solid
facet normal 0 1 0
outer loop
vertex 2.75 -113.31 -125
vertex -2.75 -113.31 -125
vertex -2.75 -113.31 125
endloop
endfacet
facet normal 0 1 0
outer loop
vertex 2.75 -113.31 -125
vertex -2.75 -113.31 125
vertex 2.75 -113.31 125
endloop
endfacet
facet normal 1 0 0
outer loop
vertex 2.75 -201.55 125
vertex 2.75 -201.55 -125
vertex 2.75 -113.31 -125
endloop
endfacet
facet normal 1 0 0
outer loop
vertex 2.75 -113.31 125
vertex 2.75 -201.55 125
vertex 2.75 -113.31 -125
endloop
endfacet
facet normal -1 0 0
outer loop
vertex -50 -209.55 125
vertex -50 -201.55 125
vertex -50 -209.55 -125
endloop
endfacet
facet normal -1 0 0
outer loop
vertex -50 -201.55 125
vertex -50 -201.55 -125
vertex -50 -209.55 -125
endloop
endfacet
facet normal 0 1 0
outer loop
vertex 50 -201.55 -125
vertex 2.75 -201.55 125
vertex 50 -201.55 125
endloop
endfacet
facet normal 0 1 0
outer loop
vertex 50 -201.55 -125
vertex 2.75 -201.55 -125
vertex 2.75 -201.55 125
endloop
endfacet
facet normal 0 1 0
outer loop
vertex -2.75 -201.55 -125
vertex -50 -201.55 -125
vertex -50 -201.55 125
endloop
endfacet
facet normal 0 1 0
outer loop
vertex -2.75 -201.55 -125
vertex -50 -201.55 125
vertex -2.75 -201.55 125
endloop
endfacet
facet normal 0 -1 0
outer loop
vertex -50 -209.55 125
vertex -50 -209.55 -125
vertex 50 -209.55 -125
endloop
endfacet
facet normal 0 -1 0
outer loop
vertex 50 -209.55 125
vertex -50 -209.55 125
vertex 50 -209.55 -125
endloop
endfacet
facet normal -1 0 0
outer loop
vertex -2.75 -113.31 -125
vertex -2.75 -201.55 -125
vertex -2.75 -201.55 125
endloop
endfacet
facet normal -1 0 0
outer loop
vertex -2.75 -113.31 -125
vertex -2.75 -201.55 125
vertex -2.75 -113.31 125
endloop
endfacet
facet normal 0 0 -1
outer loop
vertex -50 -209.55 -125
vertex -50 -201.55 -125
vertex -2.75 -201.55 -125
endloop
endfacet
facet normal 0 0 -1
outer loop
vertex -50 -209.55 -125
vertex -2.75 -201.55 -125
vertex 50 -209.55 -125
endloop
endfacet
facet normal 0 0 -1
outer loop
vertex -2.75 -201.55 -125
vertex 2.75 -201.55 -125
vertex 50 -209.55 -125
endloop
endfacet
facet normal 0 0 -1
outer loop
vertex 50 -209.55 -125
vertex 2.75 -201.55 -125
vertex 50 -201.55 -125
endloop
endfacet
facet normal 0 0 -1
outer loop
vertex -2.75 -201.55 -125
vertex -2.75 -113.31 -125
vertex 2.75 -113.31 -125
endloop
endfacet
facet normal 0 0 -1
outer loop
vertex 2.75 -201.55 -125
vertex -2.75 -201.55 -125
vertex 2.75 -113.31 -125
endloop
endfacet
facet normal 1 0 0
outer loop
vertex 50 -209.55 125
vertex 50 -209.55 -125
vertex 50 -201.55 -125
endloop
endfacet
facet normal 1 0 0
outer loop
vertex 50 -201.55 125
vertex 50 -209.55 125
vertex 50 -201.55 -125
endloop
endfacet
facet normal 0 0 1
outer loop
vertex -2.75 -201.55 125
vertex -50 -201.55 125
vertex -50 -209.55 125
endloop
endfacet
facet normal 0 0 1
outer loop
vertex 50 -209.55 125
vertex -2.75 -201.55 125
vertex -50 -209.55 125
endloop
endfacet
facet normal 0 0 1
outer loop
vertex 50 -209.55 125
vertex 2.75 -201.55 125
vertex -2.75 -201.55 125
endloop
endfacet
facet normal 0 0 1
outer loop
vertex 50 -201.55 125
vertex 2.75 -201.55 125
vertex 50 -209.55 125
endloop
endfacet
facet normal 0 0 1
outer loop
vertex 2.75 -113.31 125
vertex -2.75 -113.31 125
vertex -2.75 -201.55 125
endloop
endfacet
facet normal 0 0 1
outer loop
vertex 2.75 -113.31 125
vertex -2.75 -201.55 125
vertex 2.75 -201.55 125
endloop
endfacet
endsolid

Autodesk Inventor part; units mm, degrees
ref_plane "YZ Plane" through (0, 0, 0) normal (1, 0, 0) x (0, 1, 0)
ref_plane "XZ Plane" through (0, 0, 0) normal (0, 1, 0) x (-1, 0, 0)
ref_plane "XY Plane" through (0, 0, 0) normal (0, 0, 1) x (1, 0, 0)
sketch "草圖1" plane through (0, 0, 0) normal (0, 0, 1) x (1, 0, 0)
  circle A0 centre (0, 0) radius 109.55
  line L0 (-94.8731, -54.775) -> (-98.1293, -56.655)
  line L1 (94.8731, -54.775) -> (98.1293, -56.655)
  line L2 (-117.81, 0) -> (117.81, 0) projected
  arc A1 (-98.1293, -56.655) -> (98.1293, -56.655) centre (0, 0) ccw
  circle A2 centre (0, 0) radius 105.79
  dimension "d0" = 219.1
  dimension "d4" = 120
  dimension "d5" = 30
  dimension "d6" = 30
  dimension "d7" = 3.76
  dimension "d12" = 3.76
sketch "草圖2" plane through (0, 0, 0) normal (0, 0, 1) x (1, 0, 0)
  line L0 (-44.45, 0) -> (44.45, 0) construction
  line L1 (-50, -209.55) -> (50, -209.55)
  line L2 (0, -109.55) -> (-51.4901, -109.55) construction
  line L3 (0, -113.31) -> (0, -136.45) construction
  line L4 (-50, -201.55) -> (-50, -209.55)
  line L5 (50, -209.55) -> (50, -201.55)
  line L6 (-50, -201.55) -> (-2.75, -201.55)
  line L7 (2.75, -201.55) -> (50, -201.55)
  line L8 (-51.4901, -113.31) -> (60.072, -113.31)
  line L9 (-2.75, -201.55) -> (-2.75, -113.31)
  line L10 (2.75, -201.55) -> (2.75, -113.31)
  arc A0 (-98.1293, -56.655) -> (98.1293, -56.655) centre (0, 0) ccw projected
  circle A1 centre (0, 0) radius 109.55 projected
  point P0 (2.75, -209.55)
  point P1 (-2.75, -209.55)
  point P2 (2.75, -87.55)
  point P3 (-2.75, -87.55)
  dimension "d14" = 100
  dimension "d15" = 100
  dimension "d18" = 8
  dimension "d19" = 5.5
  dimension "d20" = 5.5
  dimension "d21" = 8
  dimension "d22" = 100
extrude "擠出3" add sketch "草圖2" along normal mid plane 250 contours L4 L6 L9 L8 L10 L7 L5 L1
equation "\"d12\" = d7"
equation "\"d14\" = Hops"
equation "\"d15\" = Section_buttom_A"
equation "\"d18\" = Section_Top_thick"
equation "\"d19\" = Section_mid_thick"
equation "\"d20\" = Section_mid_thick"
equation "\"d21\" = d18"
equation "\"d22\" = d15"
equation "\"d23\" = Lops"
equation "\"Section_buttom_A\" = 100"
equation "\"Extra_Plate_B\" = 0"
equation "\"Section_mid_thick\" = 5.5"
equation "\"Section_Top_thick\" = 8"
equation "\"Section_front_gap\" = 35"
equation "\"Section_side_Gap\" = 25"
equation "\"Hops\" = 100"
equation "\"d17\" = Section_Top_thick"
equation "\"Lops\" = Extra_Lops"
equation "\"Extra_Lops\" = 250"
properties part number "A"
